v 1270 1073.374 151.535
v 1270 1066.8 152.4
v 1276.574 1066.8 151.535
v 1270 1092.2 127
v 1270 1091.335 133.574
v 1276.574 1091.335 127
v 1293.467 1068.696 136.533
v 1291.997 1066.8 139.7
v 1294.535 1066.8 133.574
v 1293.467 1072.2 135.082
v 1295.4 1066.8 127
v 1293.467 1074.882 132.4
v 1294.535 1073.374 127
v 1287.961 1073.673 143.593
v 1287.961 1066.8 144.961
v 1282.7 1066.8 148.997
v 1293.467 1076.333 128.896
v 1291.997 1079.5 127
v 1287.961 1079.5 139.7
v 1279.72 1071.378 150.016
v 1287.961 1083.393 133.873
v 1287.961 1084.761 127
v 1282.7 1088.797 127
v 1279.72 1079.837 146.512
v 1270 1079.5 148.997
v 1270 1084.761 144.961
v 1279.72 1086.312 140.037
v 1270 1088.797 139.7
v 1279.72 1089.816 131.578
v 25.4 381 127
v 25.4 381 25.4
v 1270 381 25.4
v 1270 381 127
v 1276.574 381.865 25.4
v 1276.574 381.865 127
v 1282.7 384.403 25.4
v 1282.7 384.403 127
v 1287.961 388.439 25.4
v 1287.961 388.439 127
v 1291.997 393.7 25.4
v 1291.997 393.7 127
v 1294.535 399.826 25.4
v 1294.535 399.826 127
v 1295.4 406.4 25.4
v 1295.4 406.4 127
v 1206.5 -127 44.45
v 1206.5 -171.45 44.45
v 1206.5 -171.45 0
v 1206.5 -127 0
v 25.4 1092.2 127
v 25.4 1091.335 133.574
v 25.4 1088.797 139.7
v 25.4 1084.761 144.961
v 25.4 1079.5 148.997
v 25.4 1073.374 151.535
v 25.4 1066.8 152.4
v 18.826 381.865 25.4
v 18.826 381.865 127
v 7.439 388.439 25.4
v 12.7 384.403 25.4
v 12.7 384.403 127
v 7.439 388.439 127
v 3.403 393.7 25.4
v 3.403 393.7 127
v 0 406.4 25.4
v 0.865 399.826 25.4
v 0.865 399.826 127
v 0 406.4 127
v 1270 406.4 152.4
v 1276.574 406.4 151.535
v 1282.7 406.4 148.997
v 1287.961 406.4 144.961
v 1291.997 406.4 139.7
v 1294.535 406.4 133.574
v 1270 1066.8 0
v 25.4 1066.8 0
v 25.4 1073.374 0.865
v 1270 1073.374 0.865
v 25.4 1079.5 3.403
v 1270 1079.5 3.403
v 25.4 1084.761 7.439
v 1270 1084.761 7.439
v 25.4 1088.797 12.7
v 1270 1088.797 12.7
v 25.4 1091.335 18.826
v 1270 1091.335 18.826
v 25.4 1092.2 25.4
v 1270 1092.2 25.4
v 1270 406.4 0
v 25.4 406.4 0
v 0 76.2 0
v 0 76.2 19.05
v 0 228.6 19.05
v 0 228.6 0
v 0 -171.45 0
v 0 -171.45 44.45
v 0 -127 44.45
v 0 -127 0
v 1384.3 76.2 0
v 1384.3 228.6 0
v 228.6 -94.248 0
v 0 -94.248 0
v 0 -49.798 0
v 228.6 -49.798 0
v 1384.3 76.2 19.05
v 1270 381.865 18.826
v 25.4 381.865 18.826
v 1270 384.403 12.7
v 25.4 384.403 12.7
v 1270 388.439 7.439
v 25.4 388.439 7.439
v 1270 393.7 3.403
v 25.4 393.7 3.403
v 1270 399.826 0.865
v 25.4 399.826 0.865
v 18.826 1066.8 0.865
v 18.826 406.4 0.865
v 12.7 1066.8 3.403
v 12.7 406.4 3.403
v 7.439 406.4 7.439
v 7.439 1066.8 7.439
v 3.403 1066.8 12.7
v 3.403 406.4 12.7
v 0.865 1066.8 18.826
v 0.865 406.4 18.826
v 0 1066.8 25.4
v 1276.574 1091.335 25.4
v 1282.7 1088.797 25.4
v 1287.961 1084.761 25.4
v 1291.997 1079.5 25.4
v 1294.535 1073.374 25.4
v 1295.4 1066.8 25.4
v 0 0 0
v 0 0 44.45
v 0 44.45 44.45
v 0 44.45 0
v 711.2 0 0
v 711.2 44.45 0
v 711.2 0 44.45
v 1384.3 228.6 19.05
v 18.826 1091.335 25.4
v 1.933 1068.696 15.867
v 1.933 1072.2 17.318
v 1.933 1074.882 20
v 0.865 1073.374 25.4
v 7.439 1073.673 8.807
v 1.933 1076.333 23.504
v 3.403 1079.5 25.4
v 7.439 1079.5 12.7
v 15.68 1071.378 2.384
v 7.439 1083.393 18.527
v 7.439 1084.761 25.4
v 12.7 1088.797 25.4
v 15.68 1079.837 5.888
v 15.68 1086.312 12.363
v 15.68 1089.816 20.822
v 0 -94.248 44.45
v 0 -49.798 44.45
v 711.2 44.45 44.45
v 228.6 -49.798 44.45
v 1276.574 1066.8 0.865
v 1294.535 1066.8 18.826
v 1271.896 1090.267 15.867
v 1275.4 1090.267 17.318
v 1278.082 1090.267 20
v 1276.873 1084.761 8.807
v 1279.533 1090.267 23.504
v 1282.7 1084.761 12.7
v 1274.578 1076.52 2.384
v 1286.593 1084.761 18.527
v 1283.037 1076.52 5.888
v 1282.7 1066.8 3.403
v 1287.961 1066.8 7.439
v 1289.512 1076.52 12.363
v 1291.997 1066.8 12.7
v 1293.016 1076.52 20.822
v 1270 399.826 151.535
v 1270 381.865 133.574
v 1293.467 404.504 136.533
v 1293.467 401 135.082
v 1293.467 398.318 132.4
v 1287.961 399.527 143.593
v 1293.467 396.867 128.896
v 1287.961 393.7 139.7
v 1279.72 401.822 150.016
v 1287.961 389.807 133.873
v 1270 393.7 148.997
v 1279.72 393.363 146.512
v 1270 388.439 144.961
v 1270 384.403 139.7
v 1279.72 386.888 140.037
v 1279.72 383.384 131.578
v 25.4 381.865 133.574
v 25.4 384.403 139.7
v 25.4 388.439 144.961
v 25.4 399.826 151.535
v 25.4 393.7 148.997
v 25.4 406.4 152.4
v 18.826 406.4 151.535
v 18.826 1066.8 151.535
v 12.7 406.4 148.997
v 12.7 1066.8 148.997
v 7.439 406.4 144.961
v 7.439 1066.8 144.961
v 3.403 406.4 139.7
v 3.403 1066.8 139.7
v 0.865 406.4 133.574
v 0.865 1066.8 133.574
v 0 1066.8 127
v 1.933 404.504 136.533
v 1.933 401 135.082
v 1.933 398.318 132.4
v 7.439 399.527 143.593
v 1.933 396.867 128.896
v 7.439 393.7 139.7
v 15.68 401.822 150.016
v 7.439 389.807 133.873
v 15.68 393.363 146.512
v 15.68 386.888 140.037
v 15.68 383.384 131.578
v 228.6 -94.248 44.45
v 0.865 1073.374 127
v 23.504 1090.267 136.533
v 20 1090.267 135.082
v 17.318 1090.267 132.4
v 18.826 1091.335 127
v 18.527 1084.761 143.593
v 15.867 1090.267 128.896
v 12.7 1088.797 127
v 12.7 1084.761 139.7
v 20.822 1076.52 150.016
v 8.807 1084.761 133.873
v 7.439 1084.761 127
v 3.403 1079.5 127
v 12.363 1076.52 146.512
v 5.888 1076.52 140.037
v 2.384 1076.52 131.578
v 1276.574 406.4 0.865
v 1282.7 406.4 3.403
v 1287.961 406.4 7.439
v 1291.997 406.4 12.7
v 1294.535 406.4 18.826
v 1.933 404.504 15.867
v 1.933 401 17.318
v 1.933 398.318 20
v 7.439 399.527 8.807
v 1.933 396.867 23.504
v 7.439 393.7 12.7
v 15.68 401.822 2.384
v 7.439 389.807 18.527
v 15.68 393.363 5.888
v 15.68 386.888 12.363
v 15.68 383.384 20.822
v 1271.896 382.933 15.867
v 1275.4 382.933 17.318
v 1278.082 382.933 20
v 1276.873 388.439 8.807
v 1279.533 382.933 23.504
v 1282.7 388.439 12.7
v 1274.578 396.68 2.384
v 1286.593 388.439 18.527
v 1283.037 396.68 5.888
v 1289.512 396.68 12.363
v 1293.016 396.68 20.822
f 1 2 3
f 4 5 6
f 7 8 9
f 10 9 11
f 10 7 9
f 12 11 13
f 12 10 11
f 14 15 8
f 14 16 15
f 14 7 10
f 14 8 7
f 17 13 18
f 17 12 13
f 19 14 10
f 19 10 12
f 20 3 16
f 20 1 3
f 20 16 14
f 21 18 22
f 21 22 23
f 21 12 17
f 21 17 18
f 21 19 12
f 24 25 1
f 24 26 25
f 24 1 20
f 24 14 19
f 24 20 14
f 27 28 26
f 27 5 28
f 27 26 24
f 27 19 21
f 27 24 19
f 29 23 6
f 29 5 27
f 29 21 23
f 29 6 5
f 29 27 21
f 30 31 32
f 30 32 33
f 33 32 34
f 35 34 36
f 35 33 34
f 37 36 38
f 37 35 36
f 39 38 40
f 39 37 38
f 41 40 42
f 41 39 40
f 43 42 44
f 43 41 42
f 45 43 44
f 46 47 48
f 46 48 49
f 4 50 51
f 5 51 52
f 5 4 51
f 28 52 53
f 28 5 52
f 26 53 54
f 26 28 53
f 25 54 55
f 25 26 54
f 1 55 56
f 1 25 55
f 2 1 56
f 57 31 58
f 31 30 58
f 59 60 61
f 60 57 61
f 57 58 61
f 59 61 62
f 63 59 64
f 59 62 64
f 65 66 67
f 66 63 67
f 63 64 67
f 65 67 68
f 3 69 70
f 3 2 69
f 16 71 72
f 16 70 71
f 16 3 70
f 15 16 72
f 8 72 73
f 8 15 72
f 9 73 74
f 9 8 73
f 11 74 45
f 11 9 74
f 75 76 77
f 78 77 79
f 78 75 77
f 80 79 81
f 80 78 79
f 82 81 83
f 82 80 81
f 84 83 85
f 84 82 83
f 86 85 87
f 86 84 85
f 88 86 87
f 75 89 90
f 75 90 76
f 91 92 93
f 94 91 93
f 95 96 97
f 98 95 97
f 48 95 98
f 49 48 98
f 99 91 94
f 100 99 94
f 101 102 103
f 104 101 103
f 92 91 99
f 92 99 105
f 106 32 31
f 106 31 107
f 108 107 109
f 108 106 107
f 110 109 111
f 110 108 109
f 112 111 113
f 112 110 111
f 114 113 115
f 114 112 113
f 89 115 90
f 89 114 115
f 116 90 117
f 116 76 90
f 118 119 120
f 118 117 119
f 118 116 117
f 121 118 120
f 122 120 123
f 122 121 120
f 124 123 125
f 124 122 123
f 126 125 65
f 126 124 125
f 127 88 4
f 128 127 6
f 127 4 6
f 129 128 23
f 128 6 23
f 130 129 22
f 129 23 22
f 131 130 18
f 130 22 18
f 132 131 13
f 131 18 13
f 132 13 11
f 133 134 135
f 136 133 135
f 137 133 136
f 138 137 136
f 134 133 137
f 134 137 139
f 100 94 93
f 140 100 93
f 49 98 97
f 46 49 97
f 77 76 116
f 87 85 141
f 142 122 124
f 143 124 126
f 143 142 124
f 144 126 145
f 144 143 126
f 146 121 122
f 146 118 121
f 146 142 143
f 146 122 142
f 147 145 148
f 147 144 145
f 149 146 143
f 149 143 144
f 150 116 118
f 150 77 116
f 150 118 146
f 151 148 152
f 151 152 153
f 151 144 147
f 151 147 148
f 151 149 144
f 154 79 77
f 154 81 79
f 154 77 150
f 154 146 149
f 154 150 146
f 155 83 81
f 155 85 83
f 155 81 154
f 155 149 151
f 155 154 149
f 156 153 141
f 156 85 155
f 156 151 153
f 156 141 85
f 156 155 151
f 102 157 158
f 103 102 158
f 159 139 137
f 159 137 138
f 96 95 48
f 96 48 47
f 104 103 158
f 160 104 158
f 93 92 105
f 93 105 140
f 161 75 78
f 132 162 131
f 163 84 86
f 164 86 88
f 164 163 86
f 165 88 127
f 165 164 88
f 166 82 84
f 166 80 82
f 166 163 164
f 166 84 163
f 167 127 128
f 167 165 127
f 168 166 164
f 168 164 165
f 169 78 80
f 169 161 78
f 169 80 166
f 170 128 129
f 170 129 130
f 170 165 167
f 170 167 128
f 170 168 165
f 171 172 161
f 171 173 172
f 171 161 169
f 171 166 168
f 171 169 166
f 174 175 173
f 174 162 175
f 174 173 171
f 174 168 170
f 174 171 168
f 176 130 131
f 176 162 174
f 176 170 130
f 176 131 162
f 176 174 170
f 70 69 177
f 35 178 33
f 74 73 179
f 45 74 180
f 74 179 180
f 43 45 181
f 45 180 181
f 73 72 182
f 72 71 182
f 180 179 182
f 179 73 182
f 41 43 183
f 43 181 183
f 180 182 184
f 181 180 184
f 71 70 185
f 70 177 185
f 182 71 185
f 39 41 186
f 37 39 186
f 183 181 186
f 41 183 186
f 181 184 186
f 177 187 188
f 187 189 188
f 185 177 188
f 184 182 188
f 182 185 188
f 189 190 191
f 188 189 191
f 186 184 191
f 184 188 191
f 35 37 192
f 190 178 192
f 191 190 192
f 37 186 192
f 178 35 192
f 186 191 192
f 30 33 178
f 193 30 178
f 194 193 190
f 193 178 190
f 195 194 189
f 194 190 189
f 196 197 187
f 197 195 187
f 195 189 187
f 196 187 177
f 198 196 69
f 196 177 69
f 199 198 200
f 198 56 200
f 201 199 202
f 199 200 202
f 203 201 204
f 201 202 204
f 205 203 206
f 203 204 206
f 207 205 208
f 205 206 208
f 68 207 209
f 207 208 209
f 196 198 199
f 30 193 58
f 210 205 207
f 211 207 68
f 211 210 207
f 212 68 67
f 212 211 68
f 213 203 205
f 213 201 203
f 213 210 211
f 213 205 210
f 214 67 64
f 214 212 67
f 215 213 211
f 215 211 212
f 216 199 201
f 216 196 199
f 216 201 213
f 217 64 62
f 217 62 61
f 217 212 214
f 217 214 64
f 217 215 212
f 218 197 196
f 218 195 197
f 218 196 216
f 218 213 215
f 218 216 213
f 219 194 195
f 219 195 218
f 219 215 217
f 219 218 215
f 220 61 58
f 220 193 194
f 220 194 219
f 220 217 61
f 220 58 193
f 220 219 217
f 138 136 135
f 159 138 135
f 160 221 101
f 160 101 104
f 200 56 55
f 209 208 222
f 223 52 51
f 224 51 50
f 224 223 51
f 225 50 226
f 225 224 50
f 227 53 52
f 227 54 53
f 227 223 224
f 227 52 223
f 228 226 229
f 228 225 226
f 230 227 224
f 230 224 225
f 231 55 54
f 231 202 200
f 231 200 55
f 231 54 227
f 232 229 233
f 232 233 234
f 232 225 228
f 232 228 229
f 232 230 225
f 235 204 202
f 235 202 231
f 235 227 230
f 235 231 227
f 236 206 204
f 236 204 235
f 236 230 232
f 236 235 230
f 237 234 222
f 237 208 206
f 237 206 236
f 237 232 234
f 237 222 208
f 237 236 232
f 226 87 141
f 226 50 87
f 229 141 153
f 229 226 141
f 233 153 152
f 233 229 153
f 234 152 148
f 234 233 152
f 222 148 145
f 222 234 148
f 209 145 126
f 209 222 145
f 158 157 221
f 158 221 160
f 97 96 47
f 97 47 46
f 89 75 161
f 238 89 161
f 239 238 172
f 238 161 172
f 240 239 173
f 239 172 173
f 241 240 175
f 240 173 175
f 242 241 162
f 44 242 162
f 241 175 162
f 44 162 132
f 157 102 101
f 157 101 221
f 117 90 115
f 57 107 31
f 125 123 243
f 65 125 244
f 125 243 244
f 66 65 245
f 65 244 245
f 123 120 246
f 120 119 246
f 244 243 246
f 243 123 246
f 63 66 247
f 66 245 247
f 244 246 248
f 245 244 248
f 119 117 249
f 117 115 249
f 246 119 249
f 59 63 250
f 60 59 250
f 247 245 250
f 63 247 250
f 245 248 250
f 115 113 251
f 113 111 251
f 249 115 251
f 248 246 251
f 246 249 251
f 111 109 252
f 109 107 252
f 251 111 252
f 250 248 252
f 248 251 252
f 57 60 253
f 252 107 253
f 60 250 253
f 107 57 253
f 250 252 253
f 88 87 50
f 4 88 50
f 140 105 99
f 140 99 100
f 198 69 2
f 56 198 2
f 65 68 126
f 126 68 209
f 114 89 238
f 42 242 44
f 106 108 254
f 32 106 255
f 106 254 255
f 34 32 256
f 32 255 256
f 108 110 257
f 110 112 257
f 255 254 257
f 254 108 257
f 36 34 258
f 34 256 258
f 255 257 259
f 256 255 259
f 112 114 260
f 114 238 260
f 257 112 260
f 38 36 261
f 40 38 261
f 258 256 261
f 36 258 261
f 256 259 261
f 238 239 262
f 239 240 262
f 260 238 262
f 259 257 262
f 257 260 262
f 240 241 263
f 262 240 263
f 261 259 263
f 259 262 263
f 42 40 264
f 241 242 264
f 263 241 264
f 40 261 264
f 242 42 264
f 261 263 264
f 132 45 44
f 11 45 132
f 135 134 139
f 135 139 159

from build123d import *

# Parameters (mm, degrees)
F0_W      = 44.45
F0_H      = 44.45
F1_DEPTH  = 711.2
F3_W      = 44.45
F3_H      = 44.45
F4_DEPTH  = 228.6
F6_W      = 152.4
F6_H      = 19.05
F7_DEPTH  = 1384.3
F8_W      = 44.45
F8_H      = 44.45
F9_DEPTH  = 1206.5
F10_W     = 711.2
F10_H     = 152.4
F11_DEPTH = 1295.4
F12_R     = 25.4


with BuildPart() as f1:
    # F0 (on Right) → F1 (new body)
    with BuildSketch(Plane.YZ):
        with Locations((22.225, 22.225)):
            Rectangle(F0_W, F0_H)
    extrude(amount=F1_DEPTH)


with BuildPart() as f2_1:
    # F2: copy of F1
    add(f1.part)


with BuildPart() as f4:
    # F3 (on Right) → F4 (new body)
    with BuildSketch(Plane.YZ):
        with Locations((-72.023325, 22.225)):
            Rectangle(F3_W, F3_H)
    extrude(amount=F4_DEPTH)


with BuildPart() as f7:
    # F6 (on Right) → F7 (new body)
    with BuildSketch(Plane.YZ):
        with Locations((152.4, 9.525)):
            Rectangle(F6_W, F6_H)
    extrude(amount=F7_DEPTH)


with BuildPart() as f9:
    # F8 (on Right) → F9 (new body)
    with BuildSketch(Plane.YZ):
        with Locations((-149.225, 22.225)):
            Rectangle(F8_W, F8_H)
    extrude(amount=F9_DEPTH)


with BuildPart() as f11:
    # F10 (on Right) → F11 (new body)
    with BuildSketch(Plane.YZ):
        with Locations((736.6, 76.2)):
            Rectangle(F10_W, F10_H)
    extrude(amount=F11_DEPTH)

    # F12
    f12_edges = [f11.edges().sort_by_distance(p)[0] for p in [
        (647.7, 381, 152.4),
        (0, 736.6, 152.4),
        (647.7, 1092.2, 152.4),
        (1295.4, 736.6, 152.4),
        (1295.4, 736.6, 0),
        (647.7, 381, 0),
        (647.7, 1092.2, 0),
        (0, 736.6, 0),
        (0, 1092.2, 76.2),
        (1295.4, 1092.2, 76.2),
        (0, 381, 76.2),
        (1295.4, 381, 76.2),
    ]]
    fillet(f12_edges, radius=F12_R)


solid = Compound([f1.part, f4.part, f7.part, f9.part, f11.part])
